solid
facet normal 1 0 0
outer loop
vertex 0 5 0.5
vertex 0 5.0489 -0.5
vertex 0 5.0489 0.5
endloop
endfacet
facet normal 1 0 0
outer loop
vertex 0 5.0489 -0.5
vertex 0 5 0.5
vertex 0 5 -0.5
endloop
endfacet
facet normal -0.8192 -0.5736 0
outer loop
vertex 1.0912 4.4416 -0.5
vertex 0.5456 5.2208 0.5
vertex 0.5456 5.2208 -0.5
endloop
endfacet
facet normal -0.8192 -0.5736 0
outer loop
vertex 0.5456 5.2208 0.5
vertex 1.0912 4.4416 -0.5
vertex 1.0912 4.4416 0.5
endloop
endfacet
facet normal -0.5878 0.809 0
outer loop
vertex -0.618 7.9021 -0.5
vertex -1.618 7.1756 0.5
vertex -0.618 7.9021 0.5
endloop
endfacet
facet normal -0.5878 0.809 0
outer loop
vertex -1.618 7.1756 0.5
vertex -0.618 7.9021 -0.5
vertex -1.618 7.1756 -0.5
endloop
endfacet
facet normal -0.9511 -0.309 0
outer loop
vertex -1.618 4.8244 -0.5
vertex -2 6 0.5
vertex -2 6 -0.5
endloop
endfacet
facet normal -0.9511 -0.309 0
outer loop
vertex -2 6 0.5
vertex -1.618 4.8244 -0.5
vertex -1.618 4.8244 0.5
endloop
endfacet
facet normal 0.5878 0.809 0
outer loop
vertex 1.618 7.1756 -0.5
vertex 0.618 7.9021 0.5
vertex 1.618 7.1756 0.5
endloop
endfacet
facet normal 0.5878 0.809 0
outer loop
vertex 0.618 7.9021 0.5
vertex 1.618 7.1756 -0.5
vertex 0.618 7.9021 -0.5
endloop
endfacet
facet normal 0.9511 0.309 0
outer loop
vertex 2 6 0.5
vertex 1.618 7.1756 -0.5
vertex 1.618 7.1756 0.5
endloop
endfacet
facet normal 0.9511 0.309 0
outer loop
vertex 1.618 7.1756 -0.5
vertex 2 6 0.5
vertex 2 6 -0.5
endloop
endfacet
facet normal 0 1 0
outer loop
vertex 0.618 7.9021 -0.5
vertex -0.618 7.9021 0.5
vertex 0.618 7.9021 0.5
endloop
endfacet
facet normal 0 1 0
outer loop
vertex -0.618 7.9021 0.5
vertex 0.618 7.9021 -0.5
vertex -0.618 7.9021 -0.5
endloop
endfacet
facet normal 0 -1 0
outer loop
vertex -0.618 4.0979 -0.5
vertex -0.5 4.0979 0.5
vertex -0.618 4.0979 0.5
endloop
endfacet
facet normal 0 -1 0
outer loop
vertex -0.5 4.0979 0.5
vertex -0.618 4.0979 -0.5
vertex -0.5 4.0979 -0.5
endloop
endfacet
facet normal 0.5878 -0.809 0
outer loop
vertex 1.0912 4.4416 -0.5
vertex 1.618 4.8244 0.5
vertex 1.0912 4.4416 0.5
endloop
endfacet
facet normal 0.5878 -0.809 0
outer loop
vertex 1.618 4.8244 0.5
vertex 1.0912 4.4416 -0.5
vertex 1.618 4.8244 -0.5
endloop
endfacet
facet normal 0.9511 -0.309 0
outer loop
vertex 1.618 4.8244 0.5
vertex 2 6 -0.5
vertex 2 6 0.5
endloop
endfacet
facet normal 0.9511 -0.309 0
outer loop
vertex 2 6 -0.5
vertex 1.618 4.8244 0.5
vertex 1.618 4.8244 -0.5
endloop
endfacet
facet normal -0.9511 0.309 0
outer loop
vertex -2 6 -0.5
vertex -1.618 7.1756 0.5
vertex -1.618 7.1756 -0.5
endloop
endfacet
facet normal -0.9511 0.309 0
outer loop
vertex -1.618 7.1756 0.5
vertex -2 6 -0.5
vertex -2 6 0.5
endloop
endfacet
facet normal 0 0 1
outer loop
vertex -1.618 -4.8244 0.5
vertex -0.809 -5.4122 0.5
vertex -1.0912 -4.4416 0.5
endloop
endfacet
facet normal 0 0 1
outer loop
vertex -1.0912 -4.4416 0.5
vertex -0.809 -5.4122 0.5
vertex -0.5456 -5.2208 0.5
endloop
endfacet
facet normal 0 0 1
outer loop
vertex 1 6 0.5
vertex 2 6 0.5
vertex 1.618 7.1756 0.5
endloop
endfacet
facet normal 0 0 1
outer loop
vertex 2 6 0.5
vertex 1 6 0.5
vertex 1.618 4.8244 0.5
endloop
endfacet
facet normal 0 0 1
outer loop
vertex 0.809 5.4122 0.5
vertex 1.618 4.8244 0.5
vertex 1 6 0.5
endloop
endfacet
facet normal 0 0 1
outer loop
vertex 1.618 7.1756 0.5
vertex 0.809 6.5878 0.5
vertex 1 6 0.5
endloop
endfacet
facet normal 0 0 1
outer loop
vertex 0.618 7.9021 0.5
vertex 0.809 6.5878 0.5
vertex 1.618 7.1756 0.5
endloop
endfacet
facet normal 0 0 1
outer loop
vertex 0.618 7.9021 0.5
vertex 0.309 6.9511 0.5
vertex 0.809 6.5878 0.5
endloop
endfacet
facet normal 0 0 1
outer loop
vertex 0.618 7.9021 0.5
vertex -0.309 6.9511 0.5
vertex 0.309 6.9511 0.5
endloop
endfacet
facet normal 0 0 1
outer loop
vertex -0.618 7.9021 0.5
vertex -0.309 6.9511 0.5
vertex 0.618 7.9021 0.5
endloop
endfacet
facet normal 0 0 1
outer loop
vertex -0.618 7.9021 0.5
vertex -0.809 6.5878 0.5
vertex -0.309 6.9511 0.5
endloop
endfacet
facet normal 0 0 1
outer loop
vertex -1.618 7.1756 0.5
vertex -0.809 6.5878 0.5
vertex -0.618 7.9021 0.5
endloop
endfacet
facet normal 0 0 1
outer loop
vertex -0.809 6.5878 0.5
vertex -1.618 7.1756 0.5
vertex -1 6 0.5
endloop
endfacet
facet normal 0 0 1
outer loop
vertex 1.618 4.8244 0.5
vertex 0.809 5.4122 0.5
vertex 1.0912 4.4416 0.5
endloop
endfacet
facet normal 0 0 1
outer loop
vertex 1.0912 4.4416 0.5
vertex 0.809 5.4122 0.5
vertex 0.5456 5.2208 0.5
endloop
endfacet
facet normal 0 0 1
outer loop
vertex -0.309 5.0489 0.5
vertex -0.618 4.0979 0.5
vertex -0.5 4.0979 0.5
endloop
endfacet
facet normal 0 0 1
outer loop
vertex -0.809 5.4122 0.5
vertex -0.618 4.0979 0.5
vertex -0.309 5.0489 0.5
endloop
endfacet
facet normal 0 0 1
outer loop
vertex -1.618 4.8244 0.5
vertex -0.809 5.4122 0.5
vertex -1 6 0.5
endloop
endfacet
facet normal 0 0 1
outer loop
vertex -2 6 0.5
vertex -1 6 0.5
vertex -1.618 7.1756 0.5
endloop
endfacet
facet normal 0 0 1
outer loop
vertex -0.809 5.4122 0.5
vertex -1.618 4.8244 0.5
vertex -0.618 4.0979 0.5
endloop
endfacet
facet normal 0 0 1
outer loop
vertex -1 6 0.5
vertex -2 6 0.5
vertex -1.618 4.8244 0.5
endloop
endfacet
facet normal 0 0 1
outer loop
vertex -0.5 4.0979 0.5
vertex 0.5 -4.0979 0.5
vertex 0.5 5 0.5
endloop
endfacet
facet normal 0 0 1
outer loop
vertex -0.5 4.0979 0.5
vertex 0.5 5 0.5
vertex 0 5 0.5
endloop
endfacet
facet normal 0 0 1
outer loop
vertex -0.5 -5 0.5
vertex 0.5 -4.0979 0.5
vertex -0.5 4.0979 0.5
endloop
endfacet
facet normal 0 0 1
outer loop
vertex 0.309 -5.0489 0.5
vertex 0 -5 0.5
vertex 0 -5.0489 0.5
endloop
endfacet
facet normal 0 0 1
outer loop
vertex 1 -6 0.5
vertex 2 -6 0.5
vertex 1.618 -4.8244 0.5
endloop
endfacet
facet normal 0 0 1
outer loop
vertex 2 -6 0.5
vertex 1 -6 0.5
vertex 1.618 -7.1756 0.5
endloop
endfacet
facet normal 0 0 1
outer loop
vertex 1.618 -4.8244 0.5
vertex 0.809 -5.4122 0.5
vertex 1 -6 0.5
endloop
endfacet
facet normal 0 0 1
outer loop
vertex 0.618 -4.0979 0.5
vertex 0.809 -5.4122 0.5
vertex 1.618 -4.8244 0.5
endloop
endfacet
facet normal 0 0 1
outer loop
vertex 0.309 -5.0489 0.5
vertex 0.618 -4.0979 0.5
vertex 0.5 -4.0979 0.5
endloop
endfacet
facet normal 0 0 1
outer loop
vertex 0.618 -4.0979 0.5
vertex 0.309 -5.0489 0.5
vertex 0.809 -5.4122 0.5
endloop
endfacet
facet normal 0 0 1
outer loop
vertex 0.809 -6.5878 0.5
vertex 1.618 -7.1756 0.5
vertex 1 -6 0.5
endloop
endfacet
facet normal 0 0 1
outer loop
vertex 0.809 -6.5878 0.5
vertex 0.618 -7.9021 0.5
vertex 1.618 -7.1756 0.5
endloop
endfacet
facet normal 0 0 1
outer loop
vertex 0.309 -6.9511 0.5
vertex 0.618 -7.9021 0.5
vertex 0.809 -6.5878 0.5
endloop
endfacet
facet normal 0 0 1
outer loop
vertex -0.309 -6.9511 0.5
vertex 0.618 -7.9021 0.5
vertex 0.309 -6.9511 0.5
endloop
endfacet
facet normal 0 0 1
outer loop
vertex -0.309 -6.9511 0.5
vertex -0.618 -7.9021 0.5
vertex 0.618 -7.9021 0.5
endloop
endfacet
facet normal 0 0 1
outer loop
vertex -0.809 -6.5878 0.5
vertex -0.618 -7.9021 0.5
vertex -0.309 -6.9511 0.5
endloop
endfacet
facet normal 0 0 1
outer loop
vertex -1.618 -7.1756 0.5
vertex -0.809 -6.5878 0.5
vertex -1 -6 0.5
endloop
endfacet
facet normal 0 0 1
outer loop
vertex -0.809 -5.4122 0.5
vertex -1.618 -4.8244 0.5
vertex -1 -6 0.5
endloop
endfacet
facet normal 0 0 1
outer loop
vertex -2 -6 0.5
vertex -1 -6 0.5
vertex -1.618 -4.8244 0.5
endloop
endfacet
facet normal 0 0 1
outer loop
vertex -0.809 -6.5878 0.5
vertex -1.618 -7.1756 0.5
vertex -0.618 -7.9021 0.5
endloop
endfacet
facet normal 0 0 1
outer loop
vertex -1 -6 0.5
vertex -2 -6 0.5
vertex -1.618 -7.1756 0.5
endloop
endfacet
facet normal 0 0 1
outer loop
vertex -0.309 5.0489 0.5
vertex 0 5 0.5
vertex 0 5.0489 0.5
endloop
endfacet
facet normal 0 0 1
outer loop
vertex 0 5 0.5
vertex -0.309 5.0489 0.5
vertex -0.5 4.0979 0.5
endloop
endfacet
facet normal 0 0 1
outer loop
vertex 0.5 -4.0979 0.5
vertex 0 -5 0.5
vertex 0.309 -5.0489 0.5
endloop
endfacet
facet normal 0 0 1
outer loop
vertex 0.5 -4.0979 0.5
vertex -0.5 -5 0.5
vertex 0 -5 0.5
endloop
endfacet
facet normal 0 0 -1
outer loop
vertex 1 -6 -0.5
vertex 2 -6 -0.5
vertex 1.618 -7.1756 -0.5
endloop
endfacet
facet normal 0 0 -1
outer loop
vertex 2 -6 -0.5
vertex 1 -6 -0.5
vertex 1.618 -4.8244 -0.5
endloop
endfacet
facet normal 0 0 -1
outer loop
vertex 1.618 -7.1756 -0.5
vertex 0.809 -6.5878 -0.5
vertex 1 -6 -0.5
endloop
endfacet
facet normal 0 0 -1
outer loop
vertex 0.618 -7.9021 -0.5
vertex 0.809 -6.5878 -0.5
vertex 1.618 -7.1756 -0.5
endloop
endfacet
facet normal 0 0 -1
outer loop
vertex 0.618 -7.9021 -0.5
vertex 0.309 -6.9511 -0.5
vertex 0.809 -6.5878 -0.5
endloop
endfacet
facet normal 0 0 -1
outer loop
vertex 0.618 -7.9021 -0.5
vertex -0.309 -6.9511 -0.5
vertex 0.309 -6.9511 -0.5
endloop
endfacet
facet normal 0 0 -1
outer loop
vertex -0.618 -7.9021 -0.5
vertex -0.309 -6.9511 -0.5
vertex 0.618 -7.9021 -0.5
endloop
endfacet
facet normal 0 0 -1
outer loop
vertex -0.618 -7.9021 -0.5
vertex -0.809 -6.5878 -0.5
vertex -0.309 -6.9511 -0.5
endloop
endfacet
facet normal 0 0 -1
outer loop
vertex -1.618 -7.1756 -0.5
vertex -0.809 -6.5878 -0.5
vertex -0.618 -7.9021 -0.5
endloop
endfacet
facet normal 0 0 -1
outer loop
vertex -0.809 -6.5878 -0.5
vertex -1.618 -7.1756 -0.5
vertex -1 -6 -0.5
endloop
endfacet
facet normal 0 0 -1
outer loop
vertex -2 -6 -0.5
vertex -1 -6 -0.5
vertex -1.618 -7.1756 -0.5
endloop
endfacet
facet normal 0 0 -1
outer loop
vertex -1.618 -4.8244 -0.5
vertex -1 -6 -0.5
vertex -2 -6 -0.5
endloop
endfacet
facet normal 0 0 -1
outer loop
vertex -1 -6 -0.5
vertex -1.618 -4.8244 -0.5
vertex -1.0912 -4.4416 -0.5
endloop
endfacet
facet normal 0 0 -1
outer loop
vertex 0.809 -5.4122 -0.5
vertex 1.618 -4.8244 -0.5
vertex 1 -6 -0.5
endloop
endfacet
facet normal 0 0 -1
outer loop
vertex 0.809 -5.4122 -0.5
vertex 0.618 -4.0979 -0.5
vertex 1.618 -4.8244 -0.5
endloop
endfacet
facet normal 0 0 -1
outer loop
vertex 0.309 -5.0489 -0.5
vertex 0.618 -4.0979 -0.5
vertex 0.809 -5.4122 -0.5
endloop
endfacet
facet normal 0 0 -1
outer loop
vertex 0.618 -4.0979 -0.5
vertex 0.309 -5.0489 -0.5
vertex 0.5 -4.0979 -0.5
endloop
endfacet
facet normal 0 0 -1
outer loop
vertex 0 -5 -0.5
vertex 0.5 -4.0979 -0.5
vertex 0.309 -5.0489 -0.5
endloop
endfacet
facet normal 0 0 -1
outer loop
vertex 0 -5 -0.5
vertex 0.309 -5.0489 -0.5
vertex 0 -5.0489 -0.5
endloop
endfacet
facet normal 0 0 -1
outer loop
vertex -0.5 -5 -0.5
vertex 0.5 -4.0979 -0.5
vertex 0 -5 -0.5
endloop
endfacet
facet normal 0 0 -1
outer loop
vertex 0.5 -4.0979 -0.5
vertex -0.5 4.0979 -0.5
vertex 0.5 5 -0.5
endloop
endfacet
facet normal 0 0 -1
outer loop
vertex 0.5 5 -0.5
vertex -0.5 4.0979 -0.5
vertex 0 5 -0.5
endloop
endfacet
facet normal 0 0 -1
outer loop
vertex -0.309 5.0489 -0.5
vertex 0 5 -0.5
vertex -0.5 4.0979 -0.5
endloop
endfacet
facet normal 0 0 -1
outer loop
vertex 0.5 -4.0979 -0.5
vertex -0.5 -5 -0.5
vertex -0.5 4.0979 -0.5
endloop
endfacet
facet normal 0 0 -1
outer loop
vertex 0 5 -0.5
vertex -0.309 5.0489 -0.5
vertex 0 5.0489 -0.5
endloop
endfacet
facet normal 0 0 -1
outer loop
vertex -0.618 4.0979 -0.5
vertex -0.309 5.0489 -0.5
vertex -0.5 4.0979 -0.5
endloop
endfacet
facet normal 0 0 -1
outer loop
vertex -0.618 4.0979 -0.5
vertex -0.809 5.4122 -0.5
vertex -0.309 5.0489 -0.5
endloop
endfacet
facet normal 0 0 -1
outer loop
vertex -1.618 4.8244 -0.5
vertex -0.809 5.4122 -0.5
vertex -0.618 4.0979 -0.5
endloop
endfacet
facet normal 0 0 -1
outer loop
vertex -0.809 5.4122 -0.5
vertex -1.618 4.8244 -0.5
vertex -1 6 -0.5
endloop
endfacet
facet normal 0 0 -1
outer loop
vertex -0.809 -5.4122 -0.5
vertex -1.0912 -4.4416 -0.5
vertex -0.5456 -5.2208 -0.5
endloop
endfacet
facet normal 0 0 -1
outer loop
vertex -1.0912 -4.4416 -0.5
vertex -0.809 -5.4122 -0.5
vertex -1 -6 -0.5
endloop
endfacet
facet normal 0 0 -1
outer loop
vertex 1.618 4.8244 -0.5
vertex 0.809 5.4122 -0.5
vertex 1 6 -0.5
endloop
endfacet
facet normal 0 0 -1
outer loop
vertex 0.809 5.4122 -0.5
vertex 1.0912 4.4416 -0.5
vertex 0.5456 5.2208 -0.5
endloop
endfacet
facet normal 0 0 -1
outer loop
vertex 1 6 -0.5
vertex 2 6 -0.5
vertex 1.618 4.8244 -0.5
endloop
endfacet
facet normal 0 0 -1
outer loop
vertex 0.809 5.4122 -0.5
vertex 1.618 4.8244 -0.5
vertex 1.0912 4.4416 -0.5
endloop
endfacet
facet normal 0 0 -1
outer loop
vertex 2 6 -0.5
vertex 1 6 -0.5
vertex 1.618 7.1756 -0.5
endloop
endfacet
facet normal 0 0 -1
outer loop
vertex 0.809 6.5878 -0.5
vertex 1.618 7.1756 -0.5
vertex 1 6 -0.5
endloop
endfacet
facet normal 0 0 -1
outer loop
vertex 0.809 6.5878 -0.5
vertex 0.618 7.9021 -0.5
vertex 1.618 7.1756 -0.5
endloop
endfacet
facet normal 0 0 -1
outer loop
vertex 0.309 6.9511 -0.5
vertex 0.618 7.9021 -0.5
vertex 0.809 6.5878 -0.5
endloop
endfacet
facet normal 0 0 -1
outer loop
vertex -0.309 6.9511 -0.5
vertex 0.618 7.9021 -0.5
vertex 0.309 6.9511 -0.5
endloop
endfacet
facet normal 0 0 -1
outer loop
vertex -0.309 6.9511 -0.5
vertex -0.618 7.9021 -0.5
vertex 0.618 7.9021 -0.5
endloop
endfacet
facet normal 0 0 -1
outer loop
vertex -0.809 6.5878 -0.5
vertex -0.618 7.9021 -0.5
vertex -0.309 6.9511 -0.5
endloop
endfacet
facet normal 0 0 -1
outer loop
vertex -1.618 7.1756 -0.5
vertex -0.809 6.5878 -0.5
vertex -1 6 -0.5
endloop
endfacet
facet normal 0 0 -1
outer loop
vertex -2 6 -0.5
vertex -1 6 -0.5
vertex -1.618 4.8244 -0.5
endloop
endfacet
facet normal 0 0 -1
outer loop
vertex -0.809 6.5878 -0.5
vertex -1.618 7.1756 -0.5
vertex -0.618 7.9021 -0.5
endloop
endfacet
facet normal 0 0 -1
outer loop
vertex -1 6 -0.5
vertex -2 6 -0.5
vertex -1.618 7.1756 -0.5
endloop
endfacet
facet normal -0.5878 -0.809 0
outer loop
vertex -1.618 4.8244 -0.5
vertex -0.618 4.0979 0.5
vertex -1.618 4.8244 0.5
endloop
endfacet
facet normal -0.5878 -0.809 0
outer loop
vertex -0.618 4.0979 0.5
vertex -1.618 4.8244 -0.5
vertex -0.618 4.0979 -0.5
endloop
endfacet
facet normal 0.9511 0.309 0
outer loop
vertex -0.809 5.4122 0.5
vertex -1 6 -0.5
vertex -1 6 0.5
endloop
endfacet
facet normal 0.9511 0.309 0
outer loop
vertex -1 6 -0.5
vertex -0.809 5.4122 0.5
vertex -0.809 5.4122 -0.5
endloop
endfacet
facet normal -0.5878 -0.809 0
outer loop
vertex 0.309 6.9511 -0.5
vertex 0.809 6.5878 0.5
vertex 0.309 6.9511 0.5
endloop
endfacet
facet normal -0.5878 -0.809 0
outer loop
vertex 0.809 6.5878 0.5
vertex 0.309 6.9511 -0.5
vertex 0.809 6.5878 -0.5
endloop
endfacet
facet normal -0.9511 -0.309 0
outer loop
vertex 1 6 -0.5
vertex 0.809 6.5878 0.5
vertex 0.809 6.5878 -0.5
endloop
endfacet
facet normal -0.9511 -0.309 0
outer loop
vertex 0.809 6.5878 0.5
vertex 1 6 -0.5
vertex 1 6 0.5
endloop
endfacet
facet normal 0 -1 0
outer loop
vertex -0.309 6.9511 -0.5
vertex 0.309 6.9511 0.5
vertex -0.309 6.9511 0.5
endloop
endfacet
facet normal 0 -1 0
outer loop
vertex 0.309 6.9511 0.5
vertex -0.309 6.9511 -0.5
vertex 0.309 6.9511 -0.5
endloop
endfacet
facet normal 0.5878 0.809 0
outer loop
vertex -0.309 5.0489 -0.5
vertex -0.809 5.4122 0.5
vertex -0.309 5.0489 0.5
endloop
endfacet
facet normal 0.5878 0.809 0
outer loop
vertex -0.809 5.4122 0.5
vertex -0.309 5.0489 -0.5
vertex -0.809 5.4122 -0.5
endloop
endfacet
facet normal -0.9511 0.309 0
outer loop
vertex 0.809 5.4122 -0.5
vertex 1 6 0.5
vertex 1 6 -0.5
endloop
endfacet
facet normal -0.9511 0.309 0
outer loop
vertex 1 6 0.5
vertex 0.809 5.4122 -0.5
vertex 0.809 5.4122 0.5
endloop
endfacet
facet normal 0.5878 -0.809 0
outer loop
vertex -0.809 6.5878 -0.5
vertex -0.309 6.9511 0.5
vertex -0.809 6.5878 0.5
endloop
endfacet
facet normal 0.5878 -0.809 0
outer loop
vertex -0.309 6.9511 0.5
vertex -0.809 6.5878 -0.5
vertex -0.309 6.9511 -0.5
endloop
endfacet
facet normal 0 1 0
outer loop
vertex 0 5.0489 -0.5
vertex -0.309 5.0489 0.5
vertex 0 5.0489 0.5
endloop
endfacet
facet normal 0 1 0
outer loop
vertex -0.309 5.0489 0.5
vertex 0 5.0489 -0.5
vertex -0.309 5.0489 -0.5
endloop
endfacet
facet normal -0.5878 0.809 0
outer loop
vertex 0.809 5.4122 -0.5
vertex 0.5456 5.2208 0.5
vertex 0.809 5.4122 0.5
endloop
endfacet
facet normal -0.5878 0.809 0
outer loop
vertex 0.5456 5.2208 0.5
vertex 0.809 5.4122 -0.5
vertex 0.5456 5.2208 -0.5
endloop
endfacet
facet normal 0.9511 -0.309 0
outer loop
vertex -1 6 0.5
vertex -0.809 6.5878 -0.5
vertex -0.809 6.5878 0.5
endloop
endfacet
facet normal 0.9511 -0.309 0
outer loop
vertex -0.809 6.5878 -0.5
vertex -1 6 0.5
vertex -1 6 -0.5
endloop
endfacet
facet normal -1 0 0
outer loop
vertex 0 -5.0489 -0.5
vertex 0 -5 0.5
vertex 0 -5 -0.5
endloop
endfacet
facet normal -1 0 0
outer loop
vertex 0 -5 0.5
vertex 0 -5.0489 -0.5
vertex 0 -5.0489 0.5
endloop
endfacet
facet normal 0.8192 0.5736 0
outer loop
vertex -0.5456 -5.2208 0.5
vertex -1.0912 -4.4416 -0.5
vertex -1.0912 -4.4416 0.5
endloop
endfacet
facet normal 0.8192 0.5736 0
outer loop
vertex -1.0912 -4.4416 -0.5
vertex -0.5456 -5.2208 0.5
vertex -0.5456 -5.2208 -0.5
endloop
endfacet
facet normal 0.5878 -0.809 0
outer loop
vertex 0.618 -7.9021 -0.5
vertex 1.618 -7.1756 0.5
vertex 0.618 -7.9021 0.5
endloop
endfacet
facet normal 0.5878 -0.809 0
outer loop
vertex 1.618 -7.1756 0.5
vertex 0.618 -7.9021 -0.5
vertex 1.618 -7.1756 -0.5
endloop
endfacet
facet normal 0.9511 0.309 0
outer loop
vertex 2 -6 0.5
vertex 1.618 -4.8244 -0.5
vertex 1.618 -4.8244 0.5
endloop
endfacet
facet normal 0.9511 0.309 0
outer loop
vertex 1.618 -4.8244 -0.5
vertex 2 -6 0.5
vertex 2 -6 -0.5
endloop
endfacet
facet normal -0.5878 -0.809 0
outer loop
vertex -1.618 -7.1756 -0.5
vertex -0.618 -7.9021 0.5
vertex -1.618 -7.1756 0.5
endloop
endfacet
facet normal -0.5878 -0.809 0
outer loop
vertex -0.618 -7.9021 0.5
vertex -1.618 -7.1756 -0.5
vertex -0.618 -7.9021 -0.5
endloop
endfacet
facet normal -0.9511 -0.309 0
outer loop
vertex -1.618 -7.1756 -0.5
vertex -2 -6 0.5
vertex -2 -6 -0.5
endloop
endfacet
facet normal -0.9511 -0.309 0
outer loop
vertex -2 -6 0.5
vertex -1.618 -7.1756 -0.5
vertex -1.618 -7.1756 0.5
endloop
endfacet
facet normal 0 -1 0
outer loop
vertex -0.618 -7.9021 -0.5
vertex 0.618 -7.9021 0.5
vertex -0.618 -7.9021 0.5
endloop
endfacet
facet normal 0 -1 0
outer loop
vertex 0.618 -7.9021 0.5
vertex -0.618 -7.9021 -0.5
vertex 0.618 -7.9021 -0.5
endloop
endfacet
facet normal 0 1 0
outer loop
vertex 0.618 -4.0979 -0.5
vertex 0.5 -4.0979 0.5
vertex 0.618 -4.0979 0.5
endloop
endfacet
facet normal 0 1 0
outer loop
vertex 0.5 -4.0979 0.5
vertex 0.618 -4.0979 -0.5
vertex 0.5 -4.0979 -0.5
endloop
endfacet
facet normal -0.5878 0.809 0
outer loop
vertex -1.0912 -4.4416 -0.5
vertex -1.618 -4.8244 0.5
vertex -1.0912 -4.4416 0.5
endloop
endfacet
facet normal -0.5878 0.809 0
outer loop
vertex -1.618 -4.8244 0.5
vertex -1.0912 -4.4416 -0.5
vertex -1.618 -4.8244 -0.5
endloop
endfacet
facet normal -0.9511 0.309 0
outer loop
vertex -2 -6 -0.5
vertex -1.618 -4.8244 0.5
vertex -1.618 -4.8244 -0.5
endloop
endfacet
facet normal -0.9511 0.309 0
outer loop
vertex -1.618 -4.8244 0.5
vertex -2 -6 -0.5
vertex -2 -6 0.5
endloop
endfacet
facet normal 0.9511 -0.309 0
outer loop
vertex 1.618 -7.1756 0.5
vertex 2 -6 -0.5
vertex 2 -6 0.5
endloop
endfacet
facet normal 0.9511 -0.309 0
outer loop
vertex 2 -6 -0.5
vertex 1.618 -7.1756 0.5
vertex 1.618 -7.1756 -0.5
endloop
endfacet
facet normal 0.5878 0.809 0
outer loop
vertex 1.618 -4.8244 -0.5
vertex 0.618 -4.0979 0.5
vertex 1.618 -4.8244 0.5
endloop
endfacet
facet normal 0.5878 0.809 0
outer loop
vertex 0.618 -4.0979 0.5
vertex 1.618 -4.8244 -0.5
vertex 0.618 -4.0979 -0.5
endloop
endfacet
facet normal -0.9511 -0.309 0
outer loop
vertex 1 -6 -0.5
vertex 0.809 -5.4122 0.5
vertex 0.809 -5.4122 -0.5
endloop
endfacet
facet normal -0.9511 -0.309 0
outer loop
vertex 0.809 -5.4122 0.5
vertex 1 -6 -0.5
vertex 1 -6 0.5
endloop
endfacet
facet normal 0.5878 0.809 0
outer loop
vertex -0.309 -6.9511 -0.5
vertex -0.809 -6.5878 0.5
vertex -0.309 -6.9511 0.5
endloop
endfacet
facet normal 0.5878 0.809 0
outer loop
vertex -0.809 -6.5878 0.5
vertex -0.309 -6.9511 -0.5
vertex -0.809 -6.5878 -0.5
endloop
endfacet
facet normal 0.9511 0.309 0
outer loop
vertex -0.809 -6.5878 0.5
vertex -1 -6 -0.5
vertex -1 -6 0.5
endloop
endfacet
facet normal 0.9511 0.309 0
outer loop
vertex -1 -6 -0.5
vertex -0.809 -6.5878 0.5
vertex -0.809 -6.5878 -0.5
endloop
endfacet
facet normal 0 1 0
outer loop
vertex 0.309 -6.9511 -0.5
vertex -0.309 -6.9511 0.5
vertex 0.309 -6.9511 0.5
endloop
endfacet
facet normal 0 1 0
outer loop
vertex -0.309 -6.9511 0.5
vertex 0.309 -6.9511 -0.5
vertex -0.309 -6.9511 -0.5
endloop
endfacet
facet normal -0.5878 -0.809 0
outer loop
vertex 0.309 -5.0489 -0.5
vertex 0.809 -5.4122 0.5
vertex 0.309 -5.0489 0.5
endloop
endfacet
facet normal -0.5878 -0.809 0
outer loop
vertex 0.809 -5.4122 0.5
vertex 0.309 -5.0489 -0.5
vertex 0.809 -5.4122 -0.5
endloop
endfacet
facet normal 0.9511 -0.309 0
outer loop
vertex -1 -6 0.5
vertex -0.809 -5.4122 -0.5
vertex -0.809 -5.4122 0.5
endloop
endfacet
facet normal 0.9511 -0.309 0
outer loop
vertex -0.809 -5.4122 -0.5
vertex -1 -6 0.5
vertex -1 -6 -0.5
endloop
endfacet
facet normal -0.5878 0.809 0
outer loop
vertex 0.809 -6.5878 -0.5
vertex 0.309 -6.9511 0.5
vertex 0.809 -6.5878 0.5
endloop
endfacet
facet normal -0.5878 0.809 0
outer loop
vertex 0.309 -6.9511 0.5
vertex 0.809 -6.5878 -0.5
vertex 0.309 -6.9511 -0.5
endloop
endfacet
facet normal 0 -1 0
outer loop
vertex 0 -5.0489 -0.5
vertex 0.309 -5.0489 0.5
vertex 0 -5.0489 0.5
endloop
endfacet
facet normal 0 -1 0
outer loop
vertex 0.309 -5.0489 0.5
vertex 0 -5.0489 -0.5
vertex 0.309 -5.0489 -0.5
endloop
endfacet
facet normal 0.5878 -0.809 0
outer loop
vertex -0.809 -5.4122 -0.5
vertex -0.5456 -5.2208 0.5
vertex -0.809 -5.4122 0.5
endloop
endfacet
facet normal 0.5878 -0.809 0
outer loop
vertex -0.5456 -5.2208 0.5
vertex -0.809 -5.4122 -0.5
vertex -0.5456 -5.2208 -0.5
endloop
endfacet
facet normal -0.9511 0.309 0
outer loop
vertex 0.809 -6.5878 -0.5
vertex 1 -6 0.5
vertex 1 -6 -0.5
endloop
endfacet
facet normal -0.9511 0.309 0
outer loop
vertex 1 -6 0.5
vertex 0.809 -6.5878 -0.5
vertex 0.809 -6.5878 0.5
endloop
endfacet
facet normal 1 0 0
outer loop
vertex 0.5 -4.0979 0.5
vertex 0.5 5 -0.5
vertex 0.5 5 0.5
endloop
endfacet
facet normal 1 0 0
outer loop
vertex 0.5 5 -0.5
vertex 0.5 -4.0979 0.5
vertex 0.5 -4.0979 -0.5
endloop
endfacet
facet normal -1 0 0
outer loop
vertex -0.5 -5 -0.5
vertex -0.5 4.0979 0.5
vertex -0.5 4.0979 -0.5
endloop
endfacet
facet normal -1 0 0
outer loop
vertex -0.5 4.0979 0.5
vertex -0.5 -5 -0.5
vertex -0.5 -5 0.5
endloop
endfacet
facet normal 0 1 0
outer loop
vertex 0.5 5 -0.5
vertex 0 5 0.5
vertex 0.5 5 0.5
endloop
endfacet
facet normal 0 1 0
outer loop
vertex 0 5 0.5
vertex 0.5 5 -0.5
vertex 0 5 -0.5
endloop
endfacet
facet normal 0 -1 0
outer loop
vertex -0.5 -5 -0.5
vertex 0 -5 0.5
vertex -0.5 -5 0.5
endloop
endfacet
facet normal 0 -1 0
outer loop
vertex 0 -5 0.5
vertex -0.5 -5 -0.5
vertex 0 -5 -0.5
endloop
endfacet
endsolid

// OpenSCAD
length = 10;
width = 1;

module rotate_keep(angle)
{
    children();
    rotate(angle) children();
}

$fn = 10;

module link(length, width)
{
    cube([ width, length, width ], center = true);
    rotate_keep([ 180, 180, 0 ])
    {
        translate([ 0, length / 2 + width, 0 ]) difference()
        {
            cylinder(width, r = width * 2, center = true);
            cylinder(width + .1, r = width * 2 / 2, center = true);
            rotate([ 0, 0, -90 ]) translate([ 0, 0, -width + .1 ]) difference()
            {
                cube(width * 4);
                rotate([ 0, 0, 35 ]) cube(width * 4);
            }
        }
    }
}

link(length, width);
